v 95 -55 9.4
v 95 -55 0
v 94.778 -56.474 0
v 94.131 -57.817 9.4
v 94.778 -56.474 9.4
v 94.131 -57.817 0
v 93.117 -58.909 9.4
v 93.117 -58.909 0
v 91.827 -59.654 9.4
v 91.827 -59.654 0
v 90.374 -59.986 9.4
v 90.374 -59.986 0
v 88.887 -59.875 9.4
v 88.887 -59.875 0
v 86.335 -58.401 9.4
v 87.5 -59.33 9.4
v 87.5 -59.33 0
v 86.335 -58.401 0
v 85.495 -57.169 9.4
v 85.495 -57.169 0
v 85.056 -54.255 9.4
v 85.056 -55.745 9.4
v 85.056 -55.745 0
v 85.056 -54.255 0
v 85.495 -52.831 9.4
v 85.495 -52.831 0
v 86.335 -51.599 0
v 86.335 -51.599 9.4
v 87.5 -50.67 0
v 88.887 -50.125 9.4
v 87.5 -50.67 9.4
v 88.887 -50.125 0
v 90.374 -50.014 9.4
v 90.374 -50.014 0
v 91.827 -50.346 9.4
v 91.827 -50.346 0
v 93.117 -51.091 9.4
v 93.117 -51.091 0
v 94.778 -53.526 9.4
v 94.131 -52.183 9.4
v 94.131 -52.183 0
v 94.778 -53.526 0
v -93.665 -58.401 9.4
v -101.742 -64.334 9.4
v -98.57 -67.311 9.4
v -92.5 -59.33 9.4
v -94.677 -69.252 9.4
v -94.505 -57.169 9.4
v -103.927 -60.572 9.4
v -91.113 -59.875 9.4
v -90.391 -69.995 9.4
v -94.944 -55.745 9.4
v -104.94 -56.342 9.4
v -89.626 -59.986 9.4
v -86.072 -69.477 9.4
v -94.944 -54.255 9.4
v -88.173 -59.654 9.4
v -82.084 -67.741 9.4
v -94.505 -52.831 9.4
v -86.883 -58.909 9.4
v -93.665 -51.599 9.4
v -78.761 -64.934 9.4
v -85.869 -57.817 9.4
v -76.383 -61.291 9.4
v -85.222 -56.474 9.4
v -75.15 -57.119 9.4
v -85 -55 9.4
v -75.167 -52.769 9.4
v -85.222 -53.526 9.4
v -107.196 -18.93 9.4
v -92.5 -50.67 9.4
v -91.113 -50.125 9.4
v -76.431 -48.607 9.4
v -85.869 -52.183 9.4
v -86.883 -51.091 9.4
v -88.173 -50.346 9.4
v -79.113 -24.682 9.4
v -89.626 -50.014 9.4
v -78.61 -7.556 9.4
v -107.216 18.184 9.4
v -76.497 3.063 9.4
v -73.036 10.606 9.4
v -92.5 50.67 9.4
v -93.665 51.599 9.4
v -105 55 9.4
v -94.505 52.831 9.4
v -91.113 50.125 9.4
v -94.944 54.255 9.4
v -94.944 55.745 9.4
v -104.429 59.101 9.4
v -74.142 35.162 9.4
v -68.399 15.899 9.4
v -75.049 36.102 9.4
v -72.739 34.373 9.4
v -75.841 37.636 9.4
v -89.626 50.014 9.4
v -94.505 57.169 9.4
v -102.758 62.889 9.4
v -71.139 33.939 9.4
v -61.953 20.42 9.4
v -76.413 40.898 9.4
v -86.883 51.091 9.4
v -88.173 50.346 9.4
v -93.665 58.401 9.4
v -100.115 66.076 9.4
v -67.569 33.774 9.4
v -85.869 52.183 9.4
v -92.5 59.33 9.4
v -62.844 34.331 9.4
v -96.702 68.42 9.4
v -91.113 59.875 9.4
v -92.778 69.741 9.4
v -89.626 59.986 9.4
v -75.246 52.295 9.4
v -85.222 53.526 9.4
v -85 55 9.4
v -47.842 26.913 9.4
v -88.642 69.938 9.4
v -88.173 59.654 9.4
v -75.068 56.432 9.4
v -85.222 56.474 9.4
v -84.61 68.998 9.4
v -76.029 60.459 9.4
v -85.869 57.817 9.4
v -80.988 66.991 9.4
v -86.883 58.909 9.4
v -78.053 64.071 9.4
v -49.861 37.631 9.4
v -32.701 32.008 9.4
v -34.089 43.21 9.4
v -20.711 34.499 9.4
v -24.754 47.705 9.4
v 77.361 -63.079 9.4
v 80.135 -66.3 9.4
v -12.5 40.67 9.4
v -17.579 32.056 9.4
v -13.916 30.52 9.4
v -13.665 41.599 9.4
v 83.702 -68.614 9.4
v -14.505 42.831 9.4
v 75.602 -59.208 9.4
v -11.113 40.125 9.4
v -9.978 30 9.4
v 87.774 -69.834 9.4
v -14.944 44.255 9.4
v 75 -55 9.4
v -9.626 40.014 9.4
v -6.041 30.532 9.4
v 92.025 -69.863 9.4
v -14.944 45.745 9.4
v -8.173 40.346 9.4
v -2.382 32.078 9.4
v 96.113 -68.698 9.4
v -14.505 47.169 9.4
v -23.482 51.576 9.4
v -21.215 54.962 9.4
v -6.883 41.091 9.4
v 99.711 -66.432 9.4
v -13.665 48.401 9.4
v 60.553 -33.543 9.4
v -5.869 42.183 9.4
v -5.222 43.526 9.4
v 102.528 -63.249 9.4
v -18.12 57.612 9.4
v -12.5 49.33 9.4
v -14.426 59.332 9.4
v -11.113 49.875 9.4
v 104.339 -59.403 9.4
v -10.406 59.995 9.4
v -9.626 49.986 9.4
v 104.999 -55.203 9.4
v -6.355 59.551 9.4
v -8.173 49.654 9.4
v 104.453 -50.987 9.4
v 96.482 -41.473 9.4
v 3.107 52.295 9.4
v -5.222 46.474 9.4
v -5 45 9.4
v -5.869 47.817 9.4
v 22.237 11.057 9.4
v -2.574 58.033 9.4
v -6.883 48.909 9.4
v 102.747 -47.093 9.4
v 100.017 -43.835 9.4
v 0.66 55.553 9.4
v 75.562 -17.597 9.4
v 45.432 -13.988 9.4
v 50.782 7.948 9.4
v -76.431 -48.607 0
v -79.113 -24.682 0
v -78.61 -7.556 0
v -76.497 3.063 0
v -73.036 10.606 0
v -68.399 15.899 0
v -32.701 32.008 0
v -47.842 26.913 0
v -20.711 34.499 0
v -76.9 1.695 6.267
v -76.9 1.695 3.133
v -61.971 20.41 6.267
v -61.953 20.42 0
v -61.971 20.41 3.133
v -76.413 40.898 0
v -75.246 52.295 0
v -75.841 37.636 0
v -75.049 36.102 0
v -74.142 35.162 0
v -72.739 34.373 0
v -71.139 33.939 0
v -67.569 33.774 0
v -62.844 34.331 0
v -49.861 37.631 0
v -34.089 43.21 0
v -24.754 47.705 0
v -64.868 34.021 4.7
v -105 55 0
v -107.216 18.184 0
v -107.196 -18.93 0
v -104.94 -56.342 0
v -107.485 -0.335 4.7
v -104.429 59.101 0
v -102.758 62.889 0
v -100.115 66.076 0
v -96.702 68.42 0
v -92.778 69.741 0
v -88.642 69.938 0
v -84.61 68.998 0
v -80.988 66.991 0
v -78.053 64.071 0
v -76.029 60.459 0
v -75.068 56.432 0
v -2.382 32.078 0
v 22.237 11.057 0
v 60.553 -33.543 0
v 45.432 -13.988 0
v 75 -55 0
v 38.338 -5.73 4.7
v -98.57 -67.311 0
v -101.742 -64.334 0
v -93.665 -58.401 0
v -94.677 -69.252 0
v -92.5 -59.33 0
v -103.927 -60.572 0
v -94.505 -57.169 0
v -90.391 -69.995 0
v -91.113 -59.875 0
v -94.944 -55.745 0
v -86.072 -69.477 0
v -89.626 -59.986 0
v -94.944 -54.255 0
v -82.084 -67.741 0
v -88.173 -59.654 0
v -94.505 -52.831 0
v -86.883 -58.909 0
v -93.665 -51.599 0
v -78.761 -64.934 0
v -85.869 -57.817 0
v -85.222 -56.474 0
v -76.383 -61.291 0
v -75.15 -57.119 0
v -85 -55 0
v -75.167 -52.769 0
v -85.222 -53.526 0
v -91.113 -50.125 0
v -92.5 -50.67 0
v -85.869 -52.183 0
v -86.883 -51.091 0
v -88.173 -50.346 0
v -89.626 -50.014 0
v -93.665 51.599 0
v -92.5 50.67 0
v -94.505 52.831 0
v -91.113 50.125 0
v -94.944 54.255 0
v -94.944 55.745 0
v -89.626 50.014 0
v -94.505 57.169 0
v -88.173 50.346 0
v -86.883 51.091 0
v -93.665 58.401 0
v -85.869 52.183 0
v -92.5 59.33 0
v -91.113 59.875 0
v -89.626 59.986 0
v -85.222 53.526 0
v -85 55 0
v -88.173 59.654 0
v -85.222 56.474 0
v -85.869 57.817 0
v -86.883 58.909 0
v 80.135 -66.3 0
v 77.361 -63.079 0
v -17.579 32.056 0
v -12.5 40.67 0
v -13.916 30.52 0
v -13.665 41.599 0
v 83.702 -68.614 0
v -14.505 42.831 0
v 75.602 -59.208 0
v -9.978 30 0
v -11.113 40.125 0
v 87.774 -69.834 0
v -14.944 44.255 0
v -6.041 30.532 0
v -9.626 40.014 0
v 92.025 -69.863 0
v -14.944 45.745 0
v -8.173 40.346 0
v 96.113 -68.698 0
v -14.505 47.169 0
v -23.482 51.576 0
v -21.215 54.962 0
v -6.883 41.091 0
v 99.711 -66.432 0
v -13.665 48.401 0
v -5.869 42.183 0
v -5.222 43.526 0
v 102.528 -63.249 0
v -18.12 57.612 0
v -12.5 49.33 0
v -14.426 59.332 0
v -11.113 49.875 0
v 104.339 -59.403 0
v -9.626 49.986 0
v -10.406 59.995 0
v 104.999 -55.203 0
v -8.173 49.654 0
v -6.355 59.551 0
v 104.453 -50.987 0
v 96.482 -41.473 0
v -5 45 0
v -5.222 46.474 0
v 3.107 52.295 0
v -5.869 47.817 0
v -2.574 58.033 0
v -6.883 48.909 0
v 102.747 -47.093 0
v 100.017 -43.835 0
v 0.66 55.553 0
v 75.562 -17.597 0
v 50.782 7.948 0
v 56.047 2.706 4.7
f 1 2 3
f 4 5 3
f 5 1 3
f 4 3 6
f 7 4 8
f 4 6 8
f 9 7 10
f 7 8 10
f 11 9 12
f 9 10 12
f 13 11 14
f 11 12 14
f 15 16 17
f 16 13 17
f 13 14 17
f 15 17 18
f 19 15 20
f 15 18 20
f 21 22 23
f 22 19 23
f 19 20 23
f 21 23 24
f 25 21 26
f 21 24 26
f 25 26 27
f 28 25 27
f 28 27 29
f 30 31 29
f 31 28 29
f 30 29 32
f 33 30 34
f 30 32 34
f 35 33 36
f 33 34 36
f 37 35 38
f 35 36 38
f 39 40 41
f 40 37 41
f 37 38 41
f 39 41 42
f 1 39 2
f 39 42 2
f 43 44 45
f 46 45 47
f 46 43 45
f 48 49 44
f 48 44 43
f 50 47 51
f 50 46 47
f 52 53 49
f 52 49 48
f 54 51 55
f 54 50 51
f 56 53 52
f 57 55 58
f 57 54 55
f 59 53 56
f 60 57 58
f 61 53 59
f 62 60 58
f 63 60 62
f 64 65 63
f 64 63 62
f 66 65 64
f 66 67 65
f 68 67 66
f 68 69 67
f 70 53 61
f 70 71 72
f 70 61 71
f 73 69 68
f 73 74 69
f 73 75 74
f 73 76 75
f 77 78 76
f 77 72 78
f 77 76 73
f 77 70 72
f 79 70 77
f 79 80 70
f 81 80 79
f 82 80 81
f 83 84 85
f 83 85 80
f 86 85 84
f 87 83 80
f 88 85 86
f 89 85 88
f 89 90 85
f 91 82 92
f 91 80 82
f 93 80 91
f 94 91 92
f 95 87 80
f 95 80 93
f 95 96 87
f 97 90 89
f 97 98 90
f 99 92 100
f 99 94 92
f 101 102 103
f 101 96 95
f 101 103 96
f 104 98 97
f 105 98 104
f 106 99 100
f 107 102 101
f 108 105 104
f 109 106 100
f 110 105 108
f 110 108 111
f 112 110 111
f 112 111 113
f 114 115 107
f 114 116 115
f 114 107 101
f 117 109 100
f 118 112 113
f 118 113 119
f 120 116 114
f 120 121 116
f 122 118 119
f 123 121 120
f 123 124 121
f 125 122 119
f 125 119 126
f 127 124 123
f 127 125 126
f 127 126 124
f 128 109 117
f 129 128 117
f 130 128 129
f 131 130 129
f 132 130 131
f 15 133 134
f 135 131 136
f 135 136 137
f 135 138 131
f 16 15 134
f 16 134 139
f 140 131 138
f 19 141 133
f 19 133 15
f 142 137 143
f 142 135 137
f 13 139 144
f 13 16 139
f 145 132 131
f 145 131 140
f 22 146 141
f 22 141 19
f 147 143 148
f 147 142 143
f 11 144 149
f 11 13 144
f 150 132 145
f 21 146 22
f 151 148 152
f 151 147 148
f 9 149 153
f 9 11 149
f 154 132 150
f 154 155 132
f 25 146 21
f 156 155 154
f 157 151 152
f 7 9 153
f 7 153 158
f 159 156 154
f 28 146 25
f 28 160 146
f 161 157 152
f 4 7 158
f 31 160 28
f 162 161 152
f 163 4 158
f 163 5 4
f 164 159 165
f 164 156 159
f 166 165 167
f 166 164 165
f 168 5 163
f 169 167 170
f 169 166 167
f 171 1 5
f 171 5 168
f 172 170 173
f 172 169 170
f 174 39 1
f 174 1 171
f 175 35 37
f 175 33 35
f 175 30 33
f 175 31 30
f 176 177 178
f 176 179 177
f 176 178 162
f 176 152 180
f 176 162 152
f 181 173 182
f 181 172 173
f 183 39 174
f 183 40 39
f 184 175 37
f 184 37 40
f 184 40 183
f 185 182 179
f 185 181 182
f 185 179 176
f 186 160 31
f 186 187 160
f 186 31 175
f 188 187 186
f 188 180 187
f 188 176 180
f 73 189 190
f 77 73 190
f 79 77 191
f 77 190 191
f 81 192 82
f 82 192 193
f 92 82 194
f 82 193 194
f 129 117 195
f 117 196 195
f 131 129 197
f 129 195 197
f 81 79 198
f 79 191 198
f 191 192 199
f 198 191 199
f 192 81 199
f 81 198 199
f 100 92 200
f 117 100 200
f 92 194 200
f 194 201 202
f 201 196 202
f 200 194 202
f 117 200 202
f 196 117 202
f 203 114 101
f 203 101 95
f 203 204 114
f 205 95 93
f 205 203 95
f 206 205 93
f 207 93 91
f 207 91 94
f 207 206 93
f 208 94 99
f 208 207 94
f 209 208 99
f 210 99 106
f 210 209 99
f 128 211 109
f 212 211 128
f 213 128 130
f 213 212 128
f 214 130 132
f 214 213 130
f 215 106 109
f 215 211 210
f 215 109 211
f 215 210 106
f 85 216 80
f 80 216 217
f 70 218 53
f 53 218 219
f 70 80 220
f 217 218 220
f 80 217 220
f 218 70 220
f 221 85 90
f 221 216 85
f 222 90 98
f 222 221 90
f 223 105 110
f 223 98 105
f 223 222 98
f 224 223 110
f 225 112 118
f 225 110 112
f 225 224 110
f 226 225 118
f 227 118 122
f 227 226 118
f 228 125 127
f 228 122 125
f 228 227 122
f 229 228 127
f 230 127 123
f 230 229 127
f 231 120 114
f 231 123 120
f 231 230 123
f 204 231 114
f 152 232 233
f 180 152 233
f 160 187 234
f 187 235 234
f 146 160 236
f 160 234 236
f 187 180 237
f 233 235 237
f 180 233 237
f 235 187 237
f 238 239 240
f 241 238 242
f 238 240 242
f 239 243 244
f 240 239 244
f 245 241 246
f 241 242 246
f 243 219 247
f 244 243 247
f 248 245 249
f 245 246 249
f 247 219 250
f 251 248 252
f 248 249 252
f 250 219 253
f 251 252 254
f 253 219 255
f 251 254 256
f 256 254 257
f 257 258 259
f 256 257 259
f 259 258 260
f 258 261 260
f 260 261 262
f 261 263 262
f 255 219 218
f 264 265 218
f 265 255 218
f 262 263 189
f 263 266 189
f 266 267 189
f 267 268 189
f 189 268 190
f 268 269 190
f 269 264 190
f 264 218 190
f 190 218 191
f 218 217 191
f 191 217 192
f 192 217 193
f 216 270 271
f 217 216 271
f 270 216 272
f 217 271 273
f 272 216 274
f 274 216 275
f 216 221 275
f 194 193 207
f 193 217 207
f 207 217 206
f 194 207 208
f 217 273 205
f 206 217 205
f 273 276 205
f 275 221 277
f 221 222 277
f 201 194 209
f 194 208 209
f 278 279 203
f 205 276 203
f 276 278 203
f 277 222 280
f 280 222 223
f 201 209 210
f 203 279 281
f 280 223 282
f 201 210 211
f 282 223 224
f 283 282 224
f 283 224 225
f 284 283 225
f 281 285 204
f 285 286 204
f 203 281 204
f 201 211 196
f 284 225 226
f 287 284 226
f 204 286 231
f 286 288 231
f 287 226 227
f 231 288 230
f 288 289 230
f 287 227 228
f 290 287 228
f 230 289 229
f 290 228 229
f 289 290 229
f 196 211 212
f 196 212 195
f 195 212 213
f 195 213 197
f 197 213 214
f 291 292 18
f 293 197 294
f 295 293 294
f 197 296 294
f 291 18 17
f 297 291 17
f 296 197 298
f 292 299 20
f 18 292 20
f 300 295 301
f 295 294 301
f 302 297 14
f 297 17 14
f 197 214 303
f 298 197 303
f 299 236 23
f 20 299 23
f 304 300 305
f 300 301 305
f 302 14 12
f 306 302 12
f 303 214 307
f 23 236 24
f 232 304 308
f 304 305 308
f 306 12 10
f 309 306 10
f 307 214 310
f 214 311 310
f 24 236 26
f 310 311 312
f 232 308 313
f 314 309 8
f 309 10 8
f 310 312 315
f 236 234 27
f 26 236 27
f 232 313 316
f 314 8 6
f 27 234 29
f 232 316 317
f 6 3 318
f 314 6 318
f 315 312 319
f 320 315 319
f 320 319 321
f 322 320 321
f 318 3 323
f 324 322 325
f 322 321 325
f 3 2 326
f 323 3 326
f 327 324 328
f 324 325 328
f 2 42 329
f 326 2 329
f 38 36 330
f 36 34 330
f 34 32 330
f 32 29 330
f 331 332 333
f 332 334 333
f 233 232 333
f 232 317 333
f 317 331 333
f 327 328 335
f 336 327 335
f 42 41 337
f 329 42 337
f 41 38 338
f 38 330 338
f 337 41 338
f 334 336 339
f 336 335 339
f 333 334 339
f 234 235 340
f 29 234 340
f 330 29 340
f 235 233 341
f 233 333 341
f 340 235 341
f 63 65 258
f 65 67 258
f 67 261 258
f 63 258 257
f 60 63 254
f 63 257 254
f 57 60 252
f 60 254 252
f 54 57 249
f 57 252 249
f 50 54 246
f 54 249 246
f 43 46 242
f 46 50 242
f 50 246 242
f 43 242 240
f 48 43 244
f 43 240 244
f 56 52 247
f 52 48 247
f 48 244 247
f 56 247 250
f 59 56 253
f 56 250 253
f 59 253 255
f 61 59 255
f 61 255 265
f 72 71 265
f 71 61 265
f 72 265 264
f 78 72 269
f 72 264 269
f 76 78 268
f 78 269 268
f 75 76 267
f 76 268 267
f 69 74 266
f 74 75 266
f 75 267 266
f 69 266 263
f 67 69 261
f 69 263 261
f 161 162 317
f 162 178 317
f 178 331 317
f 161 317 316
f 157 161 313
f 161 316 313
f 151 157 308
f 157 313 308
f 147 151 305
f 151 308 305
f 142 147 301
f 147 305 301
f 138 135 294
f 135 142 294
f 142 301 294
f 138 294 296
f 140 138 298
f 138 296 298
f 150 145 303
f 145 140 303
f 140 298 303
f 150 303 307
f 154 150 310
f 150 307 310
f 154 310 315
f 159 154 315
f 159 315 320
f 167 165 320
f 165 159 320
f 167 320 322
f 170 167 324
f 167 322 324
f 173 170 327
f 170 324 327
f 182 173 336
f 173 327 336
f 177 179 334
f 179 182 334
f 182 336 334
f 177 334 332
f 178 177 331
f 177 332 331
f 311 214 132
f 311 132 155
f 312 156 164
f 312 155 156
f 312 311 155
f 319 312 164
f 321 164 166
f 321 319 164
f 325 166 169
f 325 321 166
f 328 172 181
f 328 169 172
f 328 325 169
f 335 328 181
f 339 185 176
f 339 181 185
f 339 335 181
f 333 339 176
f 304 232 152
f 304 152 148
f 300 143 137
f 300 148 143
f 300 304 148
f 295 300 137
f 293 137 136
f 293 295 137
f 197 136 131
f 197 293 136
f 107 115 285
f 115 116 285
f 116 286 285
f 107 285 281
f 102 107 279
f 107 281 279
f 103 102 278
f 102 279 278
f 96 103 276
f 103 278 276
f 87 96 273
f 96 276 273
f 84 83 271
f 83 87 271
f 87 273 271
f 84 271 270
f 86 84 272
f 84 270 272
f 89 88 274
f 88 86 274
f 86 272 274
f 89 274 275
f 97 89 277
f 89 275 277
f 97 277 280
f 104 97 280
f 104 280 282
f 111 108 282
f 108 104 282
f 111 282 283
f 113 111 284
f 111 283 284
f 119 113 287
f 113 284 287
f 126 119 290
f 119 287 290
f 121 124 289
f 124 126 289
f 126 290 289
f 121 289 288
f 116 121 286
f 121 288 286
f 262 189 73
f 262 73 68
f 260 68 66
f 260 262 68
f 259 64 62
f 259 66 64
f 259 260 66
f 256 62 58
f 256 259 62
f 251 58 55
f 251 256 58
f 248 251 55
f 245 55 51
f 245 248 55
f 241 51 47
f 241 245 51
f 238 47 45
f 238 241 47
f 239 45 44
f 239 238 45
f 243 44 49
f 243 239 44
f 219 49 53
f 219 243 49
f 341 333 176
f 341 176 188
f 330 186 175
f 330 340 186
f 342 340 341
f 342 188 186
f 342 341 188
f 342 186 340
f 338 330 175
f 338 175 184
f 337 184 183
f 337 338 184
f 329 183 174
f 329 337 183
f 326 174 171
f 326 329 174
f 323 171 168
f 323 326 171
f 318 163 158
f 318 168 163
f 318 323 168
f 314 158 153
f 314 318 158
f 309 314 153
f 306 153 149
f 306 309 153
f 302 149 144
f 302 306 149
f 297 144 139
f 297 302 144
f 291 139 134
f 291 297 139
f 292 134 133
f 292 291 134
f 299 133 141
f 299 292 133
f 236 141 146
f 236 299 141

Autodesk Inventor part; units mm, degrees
ref_plane "YZ Plane" through (0, 0, 0) normal (1, 0, 0) x (0, 1, 0)
ref_plane "XZ Plane" through (0, 0, 0) normal (0, 1, 0) x (-1, 0, 0)
ref_plane "XY Plane" through (0, 0, 0) normal (0, 0, 1) x (1, 0, 0)
sketch "Sketch1" plane through (0, 0, 0) normal (0, 0, 1) x (1, 0, 0)
  line L0 (-110, 70) -> (110, 70) construction
  line L1 (110, 70) -> (110, -70) construction
  line L2 (110, -70) -> (-110, -70) construction
  line L3 (-110, -70) -> (-110, 70) construction
  circle A0 centre (-90, 55) radius 5
  circle A1 centre (-90, -55) radius 5
  circle A2 centre (90, -55) radius 5
  circle A3 centre (-10, 45) radius 5
  line L4 (-67, 0) -> (-42, 0) construction
  line L5 (-42, 0) -> (-42, -30) construction
  line L6 (-42, -30) -> (-67, -30) construction
  line L7 (-67, -30) -> (-67, 0) construction
  circle A4 centre (-54.5, -11) radius 10 construction
  circle A5 centre (-63.5044, -24.4163) radius 3 construction
  circle A6 centre (-57.3559, -26.4695) radius 3 construction
  circle A7 centre (-51.263, -24.6531) radius 3 construction
  circle A8 centre (-45.3418, -26.5938) radius 3 construction
  arc A9 (-75.2459, 52.2951) -> (-105, 55) centre (-90, 55) ccw
  arc A10 (-104.9399, -56.3418) -> (-76.4307, -48.6067) centre (-90, -55) ccw
  arc A11 (75, -55) -> (96.4821, -41.4729) centre (90, -55) ccw
  line L8 (-105, 55) -> (-110, 0) construction
  line L9 (-110, 0) -> (-104.9399, -56.3418) construction
  spline S0 degree 2 poles (-105, 55) (-110, 0) (-104.9399, -56.3418) knots 1 1 1 2 2 2
  line L10 (-75.2459, 52.2951) -> (-77.8614, 38.0288) construction
  line L11 (-77.8614, 38.0288) -> (-75, 30.9694) construction
  line L12 (-75, 30.9694) -> (-62.6528, 32.0783) construction
  line L13 (-62.6528, 32.0783) -> (-28.1231, 45) construction
  line L14 (-28.1231, 45) -> (-24.7541, 47.7049) construction
  spline S1 degree 4 poles (-75.2459, 52.2951) (-77.8614, 38.0288) (-75, 30.9694) (-62.6528, 32.0783) (-28.1231, 45) (-24.7541, 47.7049) knots 1 1 1 1 1 2 3 3 3 3 3
  line L15 (-76.4307, -48.6067) -> (-79.8699, -29.5938) construction
  line L16 (-79.8699, -29.5938) -> (-79.8699, 0) construction
  line L17 (-79.8699, 0) -> (-73.4228, 13.4087) construction
  line L18 (-73.4228, 13.4087) -> (-61.869, 23.3517) construction
  line L19 (-61.869, 23.3517) -> (-26.4386, 34.4991) construction
  line L20 (-26.4386, 34.4991) -> (-20.7113, 34.4991) construction
  spline S2 degree 4 poles (-76.4307, -48.6067) (-79.8699, -29.5938) (-79.8699, 0) (-73.4228, 13.4087) (-61.869, 23.3517) (-26.4386, 34.4991) (-20.7113, 34.4991) knots 1 1 1 1 1 2 3 4 4 4 4 4
  line L21 (-2.3823, 32.0783) -> (40.3668, 0) construction
  line L22 (40.3668, 0) -> (75, -55) construction
  spline S3 degree 2 poles (-2.3823, 32.0783) (40.3668, 0) (75, -55) knots 1 1 1 2 2 2
  line L23 (3.1066, 52.2951) -> (62.3, 0) construction
  line L24 (62.3, 0) -> (96.4821, -41.4729) construction
  spline S4 degree 2 poles (3.1066, 52.2951) (62.3, 0) (96.4821, -41.4729) knots 1 1 1 2 2 2
  arc A12 (-20.7113, 34.4991) -> (-2.3823, 32.0783) centre (-10, 45) ccw
  arc A13 (3.1066, 52.2951) -> (-24.7541, 47.7049) centre (-10, 45) ccw
  point P0 (0, 0)
  dimension "d1" = 70
  dimension "d2" = 70
  dimension "d3" = 110
  dimension "d4" = 110
  dimension "d5" = 10
  dimension "d6" = 10
  dimension "d7" = 10
  dimension "d8" = 10
  dimension "d9" = 55
  dimension "d10" = 55
  dimension "d11" = 55
  dimension "d12" = 180
  dimension "d13" = 90
  dimension "d14" = 90
  dimension "d15" = 10
  dimension "d16" = 45
  dimension "d17" = 42
  dimension "d18" = 30
  dimension "d19" = 0
  dimension "d20" = 25
  dimension "d21" = 20
  dimension "d22" = 6
  dimension "d23" = 6
  dimension "d24" = 6
  dimension "d25" = 11
  dimension "d26" = 12.5
  dimension "d27" = 6
  dimension "d42" = 30
  dimension "d43" = 30
extrude "Extrusion3" add sketch "Sketch1" along normal blind 9.4
equation "\"d1\" = d2"
equation "\"d4\" = d3"
equation "\"d10\" = d9"
equation "\"d11\" = d9"
equation "\"d14\" = d13"
equation "\"d26\" = 0.5 * d20"
properties part number "Bracket Concept MK4"
